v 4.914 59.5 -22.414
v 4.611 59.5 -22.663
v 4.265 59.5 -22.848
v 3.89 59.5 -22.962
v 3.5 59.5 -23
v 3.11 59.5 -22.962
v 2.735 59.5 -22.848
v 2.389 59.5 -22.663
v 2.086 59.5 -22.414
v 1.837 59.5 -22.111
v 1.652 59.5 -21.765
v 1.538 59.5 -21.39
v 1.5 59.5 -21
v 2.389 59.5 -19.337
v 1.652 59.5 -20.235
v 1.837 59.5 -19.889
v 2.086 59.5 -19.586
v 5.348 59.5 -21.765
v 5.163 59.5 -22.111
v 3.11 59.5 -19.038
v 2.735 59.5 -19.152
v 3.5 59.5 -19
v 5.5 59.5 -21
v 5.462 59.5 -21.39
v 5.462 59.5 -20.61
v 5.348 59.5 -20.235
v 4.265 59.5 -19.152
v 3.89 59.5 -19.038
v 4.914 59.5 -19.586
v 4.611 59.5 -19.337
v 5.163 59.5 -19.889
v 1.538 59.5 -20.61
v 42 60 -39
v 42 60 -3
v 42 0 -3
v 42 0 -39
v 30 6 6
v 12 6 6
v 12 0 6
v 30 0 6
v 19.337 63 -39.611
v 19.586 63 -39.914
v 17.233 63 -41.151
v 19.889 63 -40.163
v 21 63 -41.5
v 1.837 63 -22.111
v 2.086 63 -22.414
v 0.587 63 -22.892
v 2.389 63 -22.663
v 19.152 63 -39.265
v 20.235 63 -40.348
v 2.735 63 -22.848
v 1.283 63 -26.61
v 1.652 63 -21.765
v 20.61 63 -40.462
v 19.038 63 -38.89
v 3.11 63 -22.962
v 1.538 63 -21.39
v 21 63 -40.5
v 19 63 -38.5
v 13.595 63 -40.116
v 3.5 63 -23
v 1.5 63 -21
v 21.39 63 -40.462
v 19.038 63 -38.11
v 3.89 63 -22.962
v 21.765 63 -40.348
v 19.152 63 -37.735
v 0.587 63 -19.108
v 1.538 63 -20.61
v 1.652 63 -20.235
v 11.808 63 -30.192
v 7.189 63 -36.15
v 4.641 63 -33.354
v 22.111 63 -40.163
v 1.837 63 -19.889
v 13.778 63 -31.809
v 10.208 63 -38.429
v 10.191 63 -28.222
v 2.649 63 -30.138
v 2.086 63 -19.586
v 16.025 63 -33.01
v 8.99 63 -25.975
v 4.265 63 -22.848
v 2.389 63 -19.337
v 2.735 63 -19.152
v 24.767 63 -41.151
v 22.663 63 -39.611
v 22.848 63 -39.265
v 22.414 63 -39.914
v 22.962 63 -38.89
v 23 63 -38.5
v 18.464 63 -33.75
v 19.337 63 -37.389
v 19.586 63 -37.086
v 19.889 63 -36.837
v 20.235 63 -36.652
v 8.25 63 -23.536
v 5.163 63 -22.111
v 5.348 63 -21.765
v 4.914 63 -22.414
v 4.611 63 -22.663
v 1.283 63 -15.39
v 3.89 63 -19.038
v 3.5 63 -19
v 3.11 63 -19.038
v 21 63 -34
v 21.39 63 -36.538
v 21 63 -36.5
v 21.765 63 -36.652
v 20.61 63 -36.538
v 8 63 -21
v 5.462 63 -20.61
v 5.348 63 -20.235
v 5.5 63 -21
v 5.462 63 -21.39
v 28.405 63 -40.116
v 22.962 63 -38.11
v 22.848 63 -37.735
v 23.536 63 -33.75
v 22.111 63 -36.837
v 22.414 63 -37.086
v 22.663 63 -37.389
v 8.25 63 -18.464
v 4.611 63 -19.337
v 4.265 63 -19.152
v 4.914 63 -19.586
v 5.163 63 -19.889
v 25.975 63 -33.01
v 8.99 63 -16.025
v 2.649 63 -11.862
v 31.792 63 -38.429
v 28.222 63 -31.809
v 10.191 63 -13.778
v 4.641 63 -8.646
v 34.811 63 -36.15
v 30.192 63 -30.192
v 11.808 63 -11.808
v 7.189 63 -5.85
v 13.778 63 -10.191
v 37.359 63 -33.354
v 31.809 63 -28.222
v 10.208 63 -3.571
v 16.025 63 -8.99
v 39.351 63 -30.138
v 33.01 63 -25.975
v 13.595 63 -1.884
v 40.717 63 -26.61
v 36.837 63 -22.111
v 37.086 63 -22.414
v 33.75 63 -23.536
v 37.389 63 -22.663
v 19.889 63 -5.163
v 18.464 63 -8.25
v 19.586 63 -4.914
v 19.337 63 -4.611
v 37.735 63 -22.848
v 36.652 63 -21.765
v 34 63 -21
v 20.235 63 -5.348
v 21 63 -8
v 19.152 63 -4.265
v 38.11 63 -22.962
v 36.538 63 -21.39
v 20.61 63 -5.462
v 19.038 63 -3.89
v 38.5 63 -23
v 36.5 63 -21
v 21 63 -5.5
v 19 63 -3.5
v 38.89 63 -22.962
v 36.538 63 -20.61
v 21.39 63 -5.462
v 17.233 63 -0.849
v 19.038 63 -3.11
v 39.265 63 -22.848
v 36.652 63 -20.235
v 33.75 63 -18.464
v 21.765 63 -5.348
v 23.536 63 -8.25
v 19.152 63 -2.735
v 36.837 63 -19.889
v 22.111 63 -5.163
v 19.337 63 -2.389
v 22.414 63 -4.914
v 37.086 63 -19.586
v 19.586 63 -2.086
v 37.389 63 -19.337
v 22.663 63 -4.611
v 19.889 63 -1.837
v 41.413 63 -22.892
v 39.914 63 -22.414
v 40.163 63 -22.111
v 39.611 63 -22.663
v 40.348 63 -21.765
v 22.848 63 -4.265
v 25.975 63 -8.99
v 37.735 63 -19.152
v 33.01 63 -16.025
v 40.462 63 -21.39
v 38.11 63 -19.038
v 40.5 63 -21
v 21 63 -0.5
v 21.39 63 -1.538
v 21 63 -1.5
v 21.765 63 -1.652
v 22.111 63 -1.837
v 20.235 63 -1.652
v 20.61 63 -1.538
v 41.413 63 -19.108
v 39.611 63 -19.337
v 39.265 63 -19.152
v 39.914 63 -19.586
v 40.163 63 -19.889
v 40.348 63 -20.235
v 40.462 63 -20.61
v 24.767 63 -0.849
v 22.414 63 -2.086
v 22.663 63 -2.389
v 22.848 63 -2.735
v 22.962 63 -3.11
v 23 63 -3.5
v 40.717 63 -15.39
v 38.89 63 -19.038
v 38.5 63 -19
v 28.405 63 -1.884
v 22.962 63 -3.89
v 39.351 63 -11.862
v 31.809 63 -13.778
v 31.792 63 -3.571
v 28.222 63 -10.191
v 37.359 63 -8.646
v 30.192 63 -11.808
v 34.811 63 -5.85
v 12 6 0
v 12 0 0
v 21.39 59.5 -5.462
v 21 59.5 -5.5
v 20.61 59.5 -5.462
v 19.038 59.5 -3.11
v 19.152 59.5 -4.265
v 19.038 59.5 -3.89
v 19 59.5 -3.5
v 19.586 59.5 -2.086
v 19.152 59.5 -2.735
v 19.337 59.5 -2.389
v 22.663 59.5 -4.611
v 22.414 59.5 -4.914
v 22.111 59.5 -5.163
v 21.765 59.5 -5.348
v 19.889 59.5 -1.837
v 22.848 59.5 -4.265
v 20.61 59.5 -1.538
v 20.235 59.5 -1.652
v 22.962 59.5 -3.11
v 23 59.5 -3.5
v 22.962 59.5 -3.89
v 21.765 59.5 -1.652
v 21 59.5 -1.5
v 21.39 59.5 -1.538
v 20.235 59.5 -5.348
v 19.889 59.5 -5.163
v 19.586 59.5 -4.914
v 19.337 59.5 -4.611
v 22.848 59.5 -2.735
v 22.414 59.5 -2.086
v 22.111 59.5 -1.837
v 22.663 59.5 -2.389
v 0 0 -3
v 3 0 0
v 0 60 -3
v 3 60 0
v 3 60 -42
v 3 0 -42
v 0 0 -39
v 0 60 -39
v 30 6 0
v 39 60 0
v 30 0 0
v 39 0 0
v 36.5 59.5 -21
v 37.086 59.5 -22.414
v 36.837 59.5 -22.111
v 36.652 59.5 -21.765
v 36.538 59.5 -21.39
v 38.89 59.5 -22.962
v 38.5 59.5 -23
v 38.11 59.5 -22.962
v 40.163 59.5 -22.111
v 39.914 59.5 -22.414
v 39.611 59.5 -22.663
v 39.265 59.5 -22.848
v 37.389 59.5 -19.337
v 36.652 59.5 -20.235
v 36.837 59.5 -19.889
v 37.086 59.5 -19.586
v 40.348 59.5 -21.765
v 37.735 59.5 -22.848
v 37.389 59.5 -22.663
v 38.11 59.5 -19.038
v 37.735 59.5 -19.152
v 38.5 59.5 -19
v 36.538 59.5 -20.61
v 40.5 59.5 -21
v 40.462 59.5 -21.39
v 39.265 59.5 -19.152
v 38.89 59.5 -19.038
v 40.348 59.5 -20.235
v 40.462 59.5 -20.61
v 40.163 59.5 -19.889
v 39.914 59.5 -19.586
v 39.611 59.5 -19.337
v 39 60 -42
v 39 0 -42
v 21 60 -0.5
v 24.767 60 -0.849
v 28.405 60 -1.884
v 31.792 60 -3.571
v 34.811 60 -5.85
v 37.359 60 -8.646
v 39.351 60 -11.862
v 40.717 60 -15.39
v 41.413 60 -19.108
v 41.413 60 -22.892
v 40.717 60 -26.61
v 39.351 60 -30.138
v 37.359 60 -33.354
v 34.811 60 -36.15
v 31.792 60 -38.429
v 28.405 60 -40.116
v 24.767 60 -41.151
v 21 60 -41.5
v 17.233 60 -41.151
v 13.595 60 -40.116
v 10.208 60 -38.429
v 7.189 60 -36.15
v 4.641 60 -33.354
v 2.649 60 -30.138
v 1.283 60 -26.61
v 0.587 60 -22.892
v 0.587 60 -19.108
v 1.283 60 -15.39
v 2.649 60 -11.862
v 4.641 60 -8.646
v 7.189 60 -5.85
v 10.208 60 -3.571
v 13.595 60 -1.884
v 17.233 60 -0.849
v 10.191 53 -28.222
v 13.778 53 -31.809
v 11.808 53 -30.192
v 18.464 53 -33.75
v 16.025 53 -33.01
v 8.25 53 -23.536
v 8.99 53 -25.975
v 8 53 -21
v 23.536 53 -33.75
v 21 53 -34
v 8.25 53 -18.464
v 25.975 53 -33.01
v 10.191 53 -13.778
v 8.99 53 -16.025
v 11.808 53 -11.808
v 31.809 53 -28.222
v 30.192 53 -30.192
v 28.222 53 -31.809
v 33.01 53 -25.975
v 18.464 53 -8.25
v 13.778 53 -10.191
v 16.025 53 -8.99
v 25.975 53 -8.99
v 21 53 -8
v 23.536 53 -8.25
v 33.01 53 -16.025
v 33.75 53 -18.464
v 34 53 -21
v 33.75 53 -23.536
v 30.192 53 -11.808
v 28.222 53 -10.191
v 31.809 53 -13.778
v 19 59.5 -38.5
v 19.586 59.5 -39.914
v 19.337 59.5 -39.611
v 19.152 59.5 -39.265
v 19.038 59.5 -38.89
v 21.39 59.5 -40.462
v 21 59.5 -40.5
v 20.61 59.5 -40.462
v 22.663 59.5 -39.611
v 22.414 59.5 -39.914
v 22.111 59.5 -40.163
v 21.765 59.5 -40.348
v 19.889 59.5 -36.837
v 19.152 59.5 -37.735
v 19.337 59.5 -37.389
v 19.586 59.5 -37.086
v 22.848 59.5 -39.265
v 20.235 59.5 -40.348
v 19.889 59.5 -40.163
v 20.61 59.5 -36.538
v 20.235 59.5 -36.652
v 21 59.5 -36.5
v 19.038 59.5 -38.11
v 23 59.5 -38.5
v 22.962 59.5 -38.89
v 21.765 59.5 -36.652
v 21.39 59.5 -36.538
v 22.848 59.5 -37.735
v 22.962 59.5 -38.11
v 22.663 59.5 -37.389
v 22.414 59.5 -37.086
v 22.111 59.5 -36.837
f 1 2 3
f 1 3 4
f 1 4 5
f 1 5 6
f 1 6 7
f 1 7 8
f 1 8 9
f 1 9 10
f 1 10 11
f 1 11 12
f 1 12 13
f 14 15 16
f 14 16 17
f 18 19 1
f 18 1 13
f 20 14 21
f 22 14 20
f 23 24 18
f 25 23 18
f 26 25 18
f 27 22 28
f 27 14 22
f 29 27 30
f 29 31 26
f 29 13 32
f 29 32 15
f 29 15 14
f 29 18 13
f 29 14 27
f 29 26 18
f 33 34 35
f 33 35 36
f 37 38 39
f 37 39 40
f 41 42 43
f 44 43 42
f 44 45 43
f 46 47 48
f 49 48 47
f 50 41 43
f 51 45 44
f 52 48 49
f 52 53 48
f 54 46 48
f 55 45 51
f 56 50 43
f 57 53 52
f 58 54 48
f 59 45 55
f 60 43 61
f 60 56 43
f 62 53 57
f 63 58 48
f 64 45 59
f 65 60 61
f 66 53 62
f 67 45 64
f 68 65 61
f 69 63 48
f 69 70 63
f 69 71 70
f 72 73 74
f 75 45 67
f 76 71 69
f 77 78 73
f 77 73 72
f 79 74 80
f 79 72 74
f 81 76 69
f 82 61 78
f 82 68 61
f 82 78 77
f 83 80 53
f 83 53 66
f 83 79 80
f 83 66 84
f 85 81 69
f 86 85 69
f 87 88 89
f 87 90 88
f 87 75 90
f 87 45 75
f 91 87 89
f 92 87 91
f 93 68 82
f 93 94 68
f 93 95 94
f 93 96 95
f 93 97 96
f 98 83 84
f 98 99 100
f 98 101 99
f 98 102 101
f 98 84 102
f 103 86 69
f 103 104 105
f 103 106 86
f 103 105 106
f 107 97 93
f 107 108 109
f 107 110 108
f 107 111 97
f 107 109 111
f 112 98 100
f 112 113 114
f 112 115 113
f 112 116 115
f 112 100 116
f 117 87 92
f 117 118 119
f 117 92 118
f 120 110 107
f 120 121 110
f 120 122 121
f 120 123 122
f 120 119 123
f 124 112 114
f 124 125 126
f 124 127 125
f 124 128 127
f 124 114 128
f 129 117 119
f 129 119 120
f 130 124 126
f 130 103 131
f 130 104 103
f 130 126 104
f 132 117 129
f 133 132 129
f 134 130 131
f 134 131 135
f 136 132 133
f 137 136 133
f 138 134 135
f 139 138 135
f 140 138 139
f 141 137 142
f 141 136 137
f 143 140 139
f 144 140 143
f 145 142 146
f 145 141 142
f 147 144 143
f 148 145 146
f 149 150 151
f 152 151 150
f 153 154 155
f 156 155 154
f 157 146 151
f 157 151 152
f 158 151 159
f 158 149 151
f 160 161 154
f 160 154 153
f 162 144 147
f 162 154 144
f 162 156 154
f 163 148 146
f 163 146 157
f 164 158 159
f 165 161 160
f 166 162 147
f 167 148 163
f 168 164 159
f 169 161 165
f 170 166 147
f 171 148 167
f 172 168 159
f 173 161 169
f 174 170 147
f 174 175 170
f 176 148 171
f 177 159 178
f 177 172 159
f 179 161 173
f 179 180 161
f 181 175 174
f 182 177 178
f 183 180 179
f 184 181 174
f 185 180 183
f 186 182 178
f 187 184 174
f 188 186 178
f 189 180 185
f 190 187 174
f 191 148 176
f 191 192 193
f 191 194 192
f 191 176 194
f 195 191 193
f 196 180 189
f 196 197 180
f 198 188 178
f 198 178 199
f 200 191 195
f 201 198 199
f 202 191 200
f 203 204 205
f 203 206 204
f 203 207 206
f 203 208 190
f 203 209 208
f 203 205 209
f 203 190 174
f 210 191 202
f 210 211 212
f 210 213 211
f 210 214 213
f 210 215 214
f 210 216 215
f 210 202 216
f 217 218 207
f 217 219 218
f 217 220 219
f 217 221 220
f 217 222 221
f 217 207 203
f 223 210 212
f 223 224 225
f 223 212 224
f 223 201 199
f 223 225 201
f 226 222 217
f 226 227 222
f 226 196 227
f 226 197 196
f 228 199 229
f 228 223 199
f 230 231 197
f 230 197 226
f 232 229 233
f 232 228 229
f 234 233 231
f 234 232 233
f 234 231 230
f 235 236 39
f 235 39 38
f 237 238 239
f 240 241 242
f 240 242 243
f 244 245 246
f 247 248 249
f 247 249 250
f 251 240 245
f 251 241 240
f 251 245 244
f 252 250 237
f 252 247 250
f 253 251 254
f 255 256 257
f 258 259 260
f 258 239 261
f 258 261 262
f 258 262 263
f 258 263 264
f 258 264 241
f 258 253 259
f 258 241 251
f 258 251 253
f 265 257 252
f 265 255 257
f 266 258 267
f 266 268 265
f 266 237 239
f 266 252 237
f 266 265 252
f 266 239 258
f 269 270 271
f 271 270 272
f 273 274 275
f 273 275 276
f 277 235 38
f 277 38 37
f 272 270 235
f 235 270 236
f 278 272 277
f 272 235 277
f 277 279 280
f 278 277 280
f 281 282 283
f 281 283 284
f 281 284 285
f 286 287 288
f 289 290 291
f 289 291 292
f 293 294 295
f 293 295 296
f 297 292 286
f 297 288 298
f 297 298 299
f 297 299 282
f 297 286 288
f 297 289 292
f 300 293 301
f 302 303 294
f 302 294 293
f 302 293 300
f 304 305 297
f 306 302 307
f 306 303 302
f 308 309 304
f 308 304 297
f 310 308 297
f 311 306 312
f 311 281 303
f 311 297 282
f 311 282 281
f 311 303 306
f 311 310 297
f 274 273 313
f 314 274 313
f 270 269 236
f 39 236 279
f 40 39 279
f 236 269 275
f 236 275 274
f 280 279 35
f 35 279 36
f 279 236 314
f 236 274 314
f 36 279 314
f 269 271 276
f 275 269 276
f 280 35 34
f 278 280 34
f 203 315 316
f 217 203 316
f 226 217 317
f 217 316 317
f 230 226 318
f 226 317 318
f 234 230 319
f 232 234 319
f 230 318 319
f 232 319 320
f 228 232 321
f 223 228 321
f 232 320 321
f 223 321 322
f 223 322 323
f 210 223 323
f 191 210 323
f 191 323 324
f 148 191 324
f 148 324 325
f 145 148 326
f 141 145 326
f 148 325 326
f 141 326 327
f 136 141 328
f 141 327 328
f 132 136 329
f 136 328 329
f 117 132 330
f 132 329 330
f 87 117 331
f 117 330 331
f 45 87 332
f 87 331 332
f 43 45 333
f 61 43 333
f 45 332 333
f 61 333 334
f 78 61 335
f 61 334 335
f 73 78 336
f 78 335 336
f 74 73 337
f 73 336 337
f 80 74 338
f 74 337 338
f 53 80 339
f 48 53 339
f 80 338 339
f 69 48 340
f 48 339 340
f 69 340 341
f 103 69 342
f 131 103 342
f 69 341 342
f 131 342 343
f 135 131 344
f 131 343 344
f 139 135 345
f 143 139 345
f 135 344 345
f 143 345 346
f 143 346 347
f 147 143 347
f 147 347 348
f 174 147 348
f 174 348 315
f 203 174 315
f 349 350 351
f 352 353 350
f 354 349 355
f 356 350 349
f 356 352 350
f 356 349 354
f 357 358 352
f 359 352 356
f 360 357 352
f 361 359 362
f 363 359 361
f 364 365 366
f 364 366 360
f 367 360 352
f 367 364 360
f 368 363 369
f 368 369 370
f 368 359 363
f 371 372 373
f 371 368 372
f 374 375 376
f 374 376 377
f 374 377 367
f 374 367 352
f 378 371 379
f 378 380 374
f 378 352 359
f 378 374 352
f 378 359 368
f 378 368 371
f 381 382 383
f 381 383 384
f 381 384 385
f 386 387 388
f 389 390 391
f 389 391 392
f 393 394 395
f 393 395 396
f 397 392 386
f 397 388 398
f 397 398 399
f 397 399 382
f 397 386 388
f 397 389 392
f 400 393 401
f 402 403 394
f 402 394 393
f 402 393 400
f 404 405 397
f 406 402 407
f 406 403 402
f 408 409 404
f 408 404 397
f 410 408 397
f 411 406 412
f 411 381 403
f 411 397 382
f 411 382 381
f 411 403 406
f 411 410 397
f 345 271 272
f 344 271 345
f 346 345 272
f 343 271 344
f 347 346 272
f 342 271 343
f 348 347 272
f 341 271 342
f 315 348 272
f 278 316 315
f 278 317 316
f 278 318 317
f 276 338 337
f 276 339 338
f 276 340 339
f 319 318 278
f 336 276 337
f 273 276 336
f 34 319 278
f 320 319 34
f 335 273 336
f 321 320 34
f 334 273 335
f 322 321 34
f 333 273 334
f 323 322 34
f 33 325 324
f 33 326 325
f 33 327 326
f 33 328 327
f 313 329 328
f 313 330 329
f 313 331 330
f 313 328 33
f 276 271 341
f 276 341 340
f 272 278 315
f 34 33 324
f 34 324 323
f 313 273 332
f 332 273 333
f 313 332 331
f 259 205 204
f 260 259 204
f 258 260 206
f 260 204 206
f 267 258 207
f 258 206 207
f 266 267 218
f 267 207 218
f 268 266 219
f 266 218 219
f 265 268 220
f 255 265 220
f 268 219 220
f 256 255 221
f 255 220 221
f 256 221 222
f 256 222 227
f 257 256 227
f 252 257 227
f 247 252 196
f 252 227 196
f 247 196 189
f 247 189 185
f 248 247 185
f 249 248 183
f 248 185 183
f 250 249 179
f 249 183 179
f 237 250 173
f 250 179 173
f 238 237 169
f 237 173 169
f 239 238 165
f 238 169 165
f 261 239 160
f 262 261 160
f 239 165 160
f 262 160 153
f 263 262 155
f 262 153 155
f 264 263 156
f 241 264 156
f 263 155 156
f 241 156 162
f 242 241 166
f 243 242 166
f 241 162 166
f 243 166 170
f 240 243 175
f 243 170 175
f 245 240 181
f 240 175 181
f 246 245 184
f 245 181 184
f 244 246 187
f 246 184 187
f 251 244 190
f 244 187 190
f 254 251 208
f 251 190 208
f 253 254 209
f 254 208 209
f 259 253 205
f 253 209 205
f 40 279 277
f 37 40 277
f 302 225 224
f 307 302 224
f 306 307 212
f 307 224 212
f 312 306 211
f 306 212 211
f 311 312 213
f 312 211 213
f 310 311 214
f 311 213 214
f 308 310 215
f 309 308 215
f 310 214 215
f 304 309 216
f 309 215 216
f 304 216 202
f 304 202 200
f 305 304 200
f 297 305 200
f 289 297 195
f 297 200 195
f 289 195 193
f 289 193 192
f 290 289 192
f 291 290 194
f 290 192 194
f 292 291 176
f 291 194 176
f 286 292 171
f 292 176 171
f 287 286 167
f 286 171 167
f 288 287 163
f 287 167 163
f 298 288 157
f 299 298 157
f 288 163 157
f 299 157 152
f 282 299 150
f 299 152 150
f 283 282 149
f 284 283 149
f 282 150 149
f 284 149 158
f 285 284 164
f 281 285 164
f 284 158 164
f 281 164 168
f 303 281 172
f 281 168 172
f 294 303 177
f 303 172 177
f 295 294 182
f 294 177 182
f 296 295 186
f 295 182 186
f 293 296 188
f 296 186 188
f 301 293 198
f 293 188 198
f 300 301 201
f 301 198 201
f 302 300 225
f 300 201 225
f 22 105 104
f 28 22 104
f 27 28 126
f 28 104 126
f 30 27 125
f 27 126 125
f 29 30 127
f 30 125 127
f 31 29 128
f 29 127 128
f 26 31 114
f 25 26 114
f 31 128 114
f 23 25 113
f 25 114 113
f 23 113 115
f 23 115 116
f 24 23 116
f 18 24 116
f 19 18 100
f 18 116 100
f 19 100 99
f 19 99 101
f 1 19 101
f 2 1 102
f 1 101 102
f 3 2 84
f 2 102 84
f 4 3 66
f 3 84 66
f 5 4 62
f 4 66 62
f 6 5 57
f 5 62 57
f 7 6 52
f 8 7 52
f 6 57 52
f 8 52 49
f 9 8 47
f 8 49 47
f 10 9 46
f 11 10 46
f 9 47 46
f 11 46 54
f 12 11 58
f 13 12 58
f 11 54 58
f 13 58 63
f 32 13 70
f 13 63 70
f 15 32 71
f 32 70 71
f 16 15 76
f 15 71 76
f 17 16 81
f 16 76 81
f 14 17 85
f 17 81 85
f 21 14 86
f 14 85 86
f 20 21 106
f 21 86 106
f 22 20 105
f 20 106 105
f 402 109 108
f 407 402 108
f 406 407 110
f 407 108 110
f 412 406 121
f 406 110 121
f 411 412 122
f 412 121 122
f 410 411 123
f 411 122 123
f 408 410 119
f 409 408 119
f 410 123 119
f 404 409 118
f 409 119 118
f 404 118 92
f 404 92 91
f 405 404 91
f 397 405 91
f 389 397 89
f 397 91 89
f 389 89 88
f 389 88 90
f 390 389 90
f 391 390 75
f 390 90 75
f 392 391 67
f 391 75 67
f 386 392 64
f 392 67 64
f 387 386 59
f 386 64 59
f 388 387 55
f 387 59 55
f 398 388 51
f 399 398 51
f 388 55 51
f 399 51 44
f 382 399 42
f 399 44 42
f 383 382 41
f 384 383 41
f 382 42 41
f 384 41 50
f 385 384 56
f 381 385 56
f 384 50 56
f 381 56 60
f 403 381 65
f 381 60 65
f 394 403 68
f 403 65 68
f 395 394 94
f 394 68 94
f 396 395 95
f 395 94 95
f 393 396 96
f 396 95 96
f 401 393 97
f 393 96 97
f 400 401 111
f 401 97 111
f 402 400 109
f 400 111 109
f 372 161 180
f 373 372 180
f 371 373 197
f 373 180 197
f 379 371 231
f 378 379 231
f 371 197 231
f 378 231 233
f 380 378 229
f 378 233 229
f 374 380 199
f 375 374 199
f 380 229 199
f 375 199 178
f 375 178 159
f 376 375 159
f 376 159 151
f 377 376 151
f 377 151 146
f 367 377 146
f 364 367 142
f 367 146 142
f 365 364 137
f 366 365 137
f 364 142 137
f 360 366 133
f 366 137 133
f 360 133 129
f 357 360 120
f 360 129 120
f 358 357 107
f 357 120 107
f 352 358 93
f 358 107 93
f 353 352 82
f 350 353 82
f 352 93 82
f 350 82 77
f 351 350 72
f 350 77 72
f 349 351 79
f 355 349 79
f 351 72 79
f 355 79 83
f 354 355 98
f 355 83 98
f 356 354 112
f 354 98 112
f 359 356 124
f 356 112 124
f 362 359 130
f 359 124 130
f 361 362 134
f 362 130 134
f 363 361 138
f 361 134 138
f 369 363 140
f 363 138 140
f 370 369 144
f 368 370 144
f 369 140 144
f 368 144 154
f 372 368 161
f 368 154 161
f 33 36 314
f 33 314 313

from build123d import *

# Parameters (mm, degrees)
ESQUISSE1_W             = 42
ESQUISSE1_H             = 42
BOSS_EXTRU_1_DEPTH      = 60
ESQUISSE2_R             = 20.5
BOSS_EXTRU_2_DEPTH      = 3
ESQUISSE3_R             = 13
ENL_V_MAT_EXTRU_1_DEPTH = 10
ESQUISSE4_R             = 2
ENL_V_MAT_EXTRU_2_DEPTH = 3.5
CHANFREIN1_SIZE         = 3
ESQUISSE5_W             = 18
ESQUISSE5_H             = 6
BOSS_EXTRU_3_DEPTH      = 6


with BuildPart() as part:
    # Esquisse1 → Boss.-Extru.1 (new body)
    with BuildSketch(Plane(origin=(0, 0, 0), x_dir=(1, 0, 0), z_dir=(0, 1, 0))):
        with Locations((21, 21)):
            Rectangle(ESQUISSE1_W, ESQUISSE1_H)
    extrude(amount=BOSS_EXTRU_1_DEPTH)

    # Esquisse2 → Boss.-Extru.2 (add)
    with BuildSketch(Plane(origin=(0, 60, 0), x_dir=(1, 0, 0), z_dir=(0, 1, 0))):
        with Locations(Location((21, 21, 0), (0, 0, 270))):
            Circle(ESQUISSE2_R)
    extrude(amount=BOSS_EXTRU_2_DEPTH)

    # Esquisse3 → Enlèv. mat.-Extru.1 (cut)
    with BuildSketch(Plane(origin=(0, 63, 0), x_dir=(1, 0, 0), z_dir=(0, 1, 0))):
        with Locations(Location((21, 21, 0), (0, 0, 270))):
            Circle(ESQUISSE3_R)
    extrude(amount=-ENL_V_MAT_EXTRU_1_DEPTH, mode=Mode.SUBTRACT)

    # Esquisse4 → Enlèv. mat.-Extru.2 (cut)
    with BuildSketch(Plane(origin=(0, 63, 0), x_dir=(1, 0, 0), z_dir=(0, 1, 0))):
        with Locations(Location((3.5, 21, 0), (0, 0, 270))):
            Circle(ESQUISSE4_R)
        with Locations(Location((21, 38.5, 0), (0, 0, 270))):
            Circle(ESQUISSE4_R)
        with Locations(Location((38.5, 21, 0), (0, 0, 270))):
            Circle(ESQUISSE4_R)
        with Locations(Location((21, 3.5, 0), (0, 0, 270))):
            Circle(ESQUISSE4_R)
    extrude(amount=-ENL_V_MAT_EXTRU_2_DEPTH, mode=Mode.SUBTRACT)

    # Chanfrein1
    chanfrein1_edges = [part.edges().sort_by_distance(p)[0] for p in [
        (0, 30, -42),
        (42, 30, -42),
        (42, 30, 0),
        (0, 30, 0),
    ]]
    chamfer(chanfrein1_edges, length=CHANFREIN1_SIZE)

    # Esquisse5 → Boss.-Extru.3 (add)
    with BuildSketch(Plane.XY):
        with Locations((21, 3)):
            Rectangle(ESQUISSE5_W, ESQUISSE5_H)
    extrude(amount=BOSS_EXTRU_3_DEPTH)


solid = part.part
